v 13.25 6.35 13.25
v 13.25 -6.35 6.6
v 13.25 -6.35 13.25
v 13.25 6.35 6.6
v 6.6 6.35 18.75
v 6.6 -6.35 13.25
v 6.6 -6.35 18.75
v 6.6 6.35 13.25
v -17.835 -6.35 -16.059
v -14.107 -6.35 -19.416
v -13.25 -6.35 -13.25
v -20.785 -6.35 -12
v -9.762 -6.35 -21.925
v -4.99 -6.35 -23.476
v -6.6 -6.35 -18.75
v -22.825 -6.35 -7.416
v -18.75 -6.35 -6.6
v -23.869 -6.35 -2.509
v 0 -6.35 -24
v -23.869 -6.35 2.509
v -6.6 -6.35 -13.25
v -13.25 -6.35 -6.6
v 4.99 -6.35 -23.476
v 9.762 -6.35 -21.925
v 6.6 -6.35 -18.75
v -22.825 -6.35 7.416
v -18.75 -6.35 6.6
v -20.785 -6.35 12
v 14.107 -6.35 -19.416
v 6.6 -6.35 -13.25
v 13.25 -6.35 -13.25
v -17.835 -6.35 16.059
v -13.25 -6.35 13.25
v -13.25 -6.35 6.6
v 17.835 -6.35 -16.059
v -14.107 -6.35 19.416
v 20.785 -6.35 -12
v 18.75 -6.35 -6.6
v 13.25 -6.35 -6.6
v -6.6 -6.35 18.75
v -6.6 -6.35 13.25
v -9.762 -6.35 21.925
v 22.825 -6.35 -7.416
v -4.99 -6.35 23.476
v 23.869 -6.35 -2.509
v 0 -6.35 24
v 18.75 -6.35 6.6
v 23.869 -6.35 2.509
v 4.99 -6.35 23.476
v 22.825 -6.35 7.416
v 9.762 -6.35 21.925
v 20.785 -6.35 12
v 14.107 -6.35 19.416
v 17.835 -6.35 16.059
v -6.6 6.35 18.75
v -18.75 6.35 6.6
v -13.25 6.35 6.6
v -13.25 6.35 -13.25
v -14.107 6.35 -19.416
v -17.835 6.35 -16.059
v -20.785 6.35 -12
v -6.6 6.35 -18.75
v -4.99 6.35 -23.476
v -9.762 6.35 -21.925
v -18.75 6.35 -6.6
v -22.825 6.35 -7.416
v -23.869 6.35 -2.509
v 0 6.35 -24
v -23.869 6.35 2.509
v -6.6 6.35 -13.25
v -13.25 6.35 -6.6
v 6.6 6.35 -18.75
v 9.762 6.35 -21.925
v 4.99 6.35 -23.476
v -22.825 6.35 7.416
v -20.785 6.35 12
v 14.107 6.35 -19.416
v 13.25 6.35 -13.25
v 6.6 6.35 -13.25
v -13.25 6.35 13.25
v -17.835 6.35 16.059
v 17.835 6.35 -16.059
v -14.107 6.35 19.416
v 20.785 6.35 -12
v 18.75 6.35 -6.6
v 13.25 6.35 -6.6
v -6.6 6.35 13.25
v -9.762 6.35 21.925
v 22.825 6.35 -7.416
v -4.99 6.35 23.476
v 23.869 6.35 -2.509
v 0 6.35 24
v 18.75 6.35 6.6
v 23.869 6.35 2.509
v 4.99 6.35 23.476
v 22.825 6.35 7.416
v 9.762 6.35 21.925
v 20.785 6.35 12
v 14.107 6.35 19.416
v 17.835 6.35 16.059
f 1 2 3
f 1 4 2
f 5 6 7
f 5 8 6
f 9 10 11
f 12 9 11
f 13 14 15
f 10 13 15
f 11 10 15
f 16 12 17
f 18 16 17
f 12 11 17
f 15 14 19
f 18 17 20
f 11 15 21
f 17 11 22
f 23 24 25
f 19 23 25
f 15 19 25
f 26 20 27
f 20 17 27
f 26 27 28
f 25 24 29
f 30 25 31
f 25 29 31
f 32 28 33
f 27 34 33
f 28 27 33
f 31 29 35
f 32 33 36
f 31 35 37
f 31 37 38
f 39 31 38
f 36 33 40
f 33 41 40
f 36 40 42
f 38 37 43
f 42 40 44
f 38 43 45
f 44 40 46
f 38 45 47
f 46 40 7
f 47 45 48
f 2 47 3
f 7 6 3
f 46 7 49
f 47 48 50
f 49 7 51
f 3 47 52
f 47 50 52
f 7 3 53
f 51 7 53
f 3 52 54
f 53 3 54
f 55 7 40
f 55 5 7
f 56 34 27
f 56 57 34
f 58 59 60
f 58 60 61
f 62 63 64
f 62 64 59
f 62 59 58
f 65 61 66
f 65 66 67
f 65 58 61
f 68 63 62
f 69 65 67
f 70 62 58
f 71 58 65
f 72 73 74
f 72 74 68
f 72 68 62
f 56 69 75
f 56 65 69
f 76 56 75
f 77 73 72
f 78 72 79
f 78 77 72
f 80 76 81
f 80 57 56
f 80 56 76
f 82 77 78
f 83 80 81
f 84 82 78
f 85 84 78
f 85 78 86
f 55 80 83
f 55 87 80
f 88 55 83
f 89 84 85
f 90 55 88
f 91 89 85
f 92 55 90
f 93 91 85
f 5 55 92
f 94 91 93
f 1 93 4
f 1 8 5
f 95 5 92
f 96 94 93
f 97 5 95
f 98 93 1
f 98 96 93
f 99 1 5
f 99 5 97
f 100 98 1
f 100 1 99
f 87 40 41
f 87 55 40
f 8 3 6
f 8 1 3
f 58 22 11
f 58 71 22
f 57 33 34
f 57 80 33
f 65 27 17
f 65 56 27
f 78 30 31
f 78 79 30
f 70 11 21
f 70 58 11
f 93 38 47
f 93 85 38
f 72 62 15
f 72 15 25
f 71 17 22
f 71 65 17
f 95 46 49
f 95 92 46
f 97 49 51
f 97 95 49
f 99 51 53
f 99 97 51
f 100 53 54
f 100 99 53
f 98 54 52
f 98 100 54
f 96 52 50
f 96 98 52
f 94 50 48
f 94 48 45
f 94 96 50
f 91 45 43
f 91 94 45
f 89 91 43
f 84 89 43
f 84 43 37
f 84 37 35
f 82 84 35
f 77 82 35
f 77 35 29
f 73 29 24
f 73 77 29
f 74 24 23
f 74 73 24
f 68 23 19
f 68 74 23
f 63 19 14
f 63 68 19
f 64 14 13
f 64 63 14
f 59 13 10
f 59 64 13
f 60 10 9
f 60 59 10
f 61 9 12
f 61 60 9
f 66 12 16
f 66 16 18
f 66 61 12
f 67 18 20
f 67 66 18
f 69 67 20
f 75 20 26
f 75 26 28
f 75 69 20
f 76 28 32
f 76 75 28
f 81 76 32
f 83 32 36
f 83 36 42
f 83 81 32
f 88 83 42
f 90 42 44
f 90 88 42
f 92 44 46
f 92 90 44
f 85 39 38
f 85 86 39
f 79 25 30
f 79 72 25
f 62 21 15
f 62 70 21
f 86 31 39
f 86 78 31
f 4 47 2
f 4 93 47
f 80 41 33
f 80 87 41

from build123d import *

# Parameters (mm, degrees)
SKETCH1_R           = 24
BOSS_EXTRUDE1_DEPTH = 6.35


with BuildPart() as part:
    # Sketch1 → Boss-Extrude1 (new, symmetric)
    with BuildSketch(Plane(origin=(0, 0, 0), x_dir=(1, 0, 0), z_dir=(0, 1, 0))):
        with Locations(Location((0, 0, 0), (0, 0, 270))):
            Circle(SKETCH1_R)
        Polygon((-6.6, 18.75), (6.6, 18.75), (6.6, 13.25), (13.25, 13.25), (13.25, 6.6), (18.75, 6.6), (18.75, -6.6), (13.25, -6.6), (13.25, -13.25), (6.6, -13.25), (6.6, -18.75), (-6.6, -18.75), (-6.6, -13.25), (-13.25, -13.25), (-13.25, -6.6), (-18.75, -6.6), (-18.75, 6.6), (-13.25, 6.6), (-13.25, 13.25), (-6.6, 13.25), align=None, mode=Mode.SUBTRACT)
    extrude(amount=BOSS_EXTRUDE1_DEPTH, both=True)


solid = part.part
